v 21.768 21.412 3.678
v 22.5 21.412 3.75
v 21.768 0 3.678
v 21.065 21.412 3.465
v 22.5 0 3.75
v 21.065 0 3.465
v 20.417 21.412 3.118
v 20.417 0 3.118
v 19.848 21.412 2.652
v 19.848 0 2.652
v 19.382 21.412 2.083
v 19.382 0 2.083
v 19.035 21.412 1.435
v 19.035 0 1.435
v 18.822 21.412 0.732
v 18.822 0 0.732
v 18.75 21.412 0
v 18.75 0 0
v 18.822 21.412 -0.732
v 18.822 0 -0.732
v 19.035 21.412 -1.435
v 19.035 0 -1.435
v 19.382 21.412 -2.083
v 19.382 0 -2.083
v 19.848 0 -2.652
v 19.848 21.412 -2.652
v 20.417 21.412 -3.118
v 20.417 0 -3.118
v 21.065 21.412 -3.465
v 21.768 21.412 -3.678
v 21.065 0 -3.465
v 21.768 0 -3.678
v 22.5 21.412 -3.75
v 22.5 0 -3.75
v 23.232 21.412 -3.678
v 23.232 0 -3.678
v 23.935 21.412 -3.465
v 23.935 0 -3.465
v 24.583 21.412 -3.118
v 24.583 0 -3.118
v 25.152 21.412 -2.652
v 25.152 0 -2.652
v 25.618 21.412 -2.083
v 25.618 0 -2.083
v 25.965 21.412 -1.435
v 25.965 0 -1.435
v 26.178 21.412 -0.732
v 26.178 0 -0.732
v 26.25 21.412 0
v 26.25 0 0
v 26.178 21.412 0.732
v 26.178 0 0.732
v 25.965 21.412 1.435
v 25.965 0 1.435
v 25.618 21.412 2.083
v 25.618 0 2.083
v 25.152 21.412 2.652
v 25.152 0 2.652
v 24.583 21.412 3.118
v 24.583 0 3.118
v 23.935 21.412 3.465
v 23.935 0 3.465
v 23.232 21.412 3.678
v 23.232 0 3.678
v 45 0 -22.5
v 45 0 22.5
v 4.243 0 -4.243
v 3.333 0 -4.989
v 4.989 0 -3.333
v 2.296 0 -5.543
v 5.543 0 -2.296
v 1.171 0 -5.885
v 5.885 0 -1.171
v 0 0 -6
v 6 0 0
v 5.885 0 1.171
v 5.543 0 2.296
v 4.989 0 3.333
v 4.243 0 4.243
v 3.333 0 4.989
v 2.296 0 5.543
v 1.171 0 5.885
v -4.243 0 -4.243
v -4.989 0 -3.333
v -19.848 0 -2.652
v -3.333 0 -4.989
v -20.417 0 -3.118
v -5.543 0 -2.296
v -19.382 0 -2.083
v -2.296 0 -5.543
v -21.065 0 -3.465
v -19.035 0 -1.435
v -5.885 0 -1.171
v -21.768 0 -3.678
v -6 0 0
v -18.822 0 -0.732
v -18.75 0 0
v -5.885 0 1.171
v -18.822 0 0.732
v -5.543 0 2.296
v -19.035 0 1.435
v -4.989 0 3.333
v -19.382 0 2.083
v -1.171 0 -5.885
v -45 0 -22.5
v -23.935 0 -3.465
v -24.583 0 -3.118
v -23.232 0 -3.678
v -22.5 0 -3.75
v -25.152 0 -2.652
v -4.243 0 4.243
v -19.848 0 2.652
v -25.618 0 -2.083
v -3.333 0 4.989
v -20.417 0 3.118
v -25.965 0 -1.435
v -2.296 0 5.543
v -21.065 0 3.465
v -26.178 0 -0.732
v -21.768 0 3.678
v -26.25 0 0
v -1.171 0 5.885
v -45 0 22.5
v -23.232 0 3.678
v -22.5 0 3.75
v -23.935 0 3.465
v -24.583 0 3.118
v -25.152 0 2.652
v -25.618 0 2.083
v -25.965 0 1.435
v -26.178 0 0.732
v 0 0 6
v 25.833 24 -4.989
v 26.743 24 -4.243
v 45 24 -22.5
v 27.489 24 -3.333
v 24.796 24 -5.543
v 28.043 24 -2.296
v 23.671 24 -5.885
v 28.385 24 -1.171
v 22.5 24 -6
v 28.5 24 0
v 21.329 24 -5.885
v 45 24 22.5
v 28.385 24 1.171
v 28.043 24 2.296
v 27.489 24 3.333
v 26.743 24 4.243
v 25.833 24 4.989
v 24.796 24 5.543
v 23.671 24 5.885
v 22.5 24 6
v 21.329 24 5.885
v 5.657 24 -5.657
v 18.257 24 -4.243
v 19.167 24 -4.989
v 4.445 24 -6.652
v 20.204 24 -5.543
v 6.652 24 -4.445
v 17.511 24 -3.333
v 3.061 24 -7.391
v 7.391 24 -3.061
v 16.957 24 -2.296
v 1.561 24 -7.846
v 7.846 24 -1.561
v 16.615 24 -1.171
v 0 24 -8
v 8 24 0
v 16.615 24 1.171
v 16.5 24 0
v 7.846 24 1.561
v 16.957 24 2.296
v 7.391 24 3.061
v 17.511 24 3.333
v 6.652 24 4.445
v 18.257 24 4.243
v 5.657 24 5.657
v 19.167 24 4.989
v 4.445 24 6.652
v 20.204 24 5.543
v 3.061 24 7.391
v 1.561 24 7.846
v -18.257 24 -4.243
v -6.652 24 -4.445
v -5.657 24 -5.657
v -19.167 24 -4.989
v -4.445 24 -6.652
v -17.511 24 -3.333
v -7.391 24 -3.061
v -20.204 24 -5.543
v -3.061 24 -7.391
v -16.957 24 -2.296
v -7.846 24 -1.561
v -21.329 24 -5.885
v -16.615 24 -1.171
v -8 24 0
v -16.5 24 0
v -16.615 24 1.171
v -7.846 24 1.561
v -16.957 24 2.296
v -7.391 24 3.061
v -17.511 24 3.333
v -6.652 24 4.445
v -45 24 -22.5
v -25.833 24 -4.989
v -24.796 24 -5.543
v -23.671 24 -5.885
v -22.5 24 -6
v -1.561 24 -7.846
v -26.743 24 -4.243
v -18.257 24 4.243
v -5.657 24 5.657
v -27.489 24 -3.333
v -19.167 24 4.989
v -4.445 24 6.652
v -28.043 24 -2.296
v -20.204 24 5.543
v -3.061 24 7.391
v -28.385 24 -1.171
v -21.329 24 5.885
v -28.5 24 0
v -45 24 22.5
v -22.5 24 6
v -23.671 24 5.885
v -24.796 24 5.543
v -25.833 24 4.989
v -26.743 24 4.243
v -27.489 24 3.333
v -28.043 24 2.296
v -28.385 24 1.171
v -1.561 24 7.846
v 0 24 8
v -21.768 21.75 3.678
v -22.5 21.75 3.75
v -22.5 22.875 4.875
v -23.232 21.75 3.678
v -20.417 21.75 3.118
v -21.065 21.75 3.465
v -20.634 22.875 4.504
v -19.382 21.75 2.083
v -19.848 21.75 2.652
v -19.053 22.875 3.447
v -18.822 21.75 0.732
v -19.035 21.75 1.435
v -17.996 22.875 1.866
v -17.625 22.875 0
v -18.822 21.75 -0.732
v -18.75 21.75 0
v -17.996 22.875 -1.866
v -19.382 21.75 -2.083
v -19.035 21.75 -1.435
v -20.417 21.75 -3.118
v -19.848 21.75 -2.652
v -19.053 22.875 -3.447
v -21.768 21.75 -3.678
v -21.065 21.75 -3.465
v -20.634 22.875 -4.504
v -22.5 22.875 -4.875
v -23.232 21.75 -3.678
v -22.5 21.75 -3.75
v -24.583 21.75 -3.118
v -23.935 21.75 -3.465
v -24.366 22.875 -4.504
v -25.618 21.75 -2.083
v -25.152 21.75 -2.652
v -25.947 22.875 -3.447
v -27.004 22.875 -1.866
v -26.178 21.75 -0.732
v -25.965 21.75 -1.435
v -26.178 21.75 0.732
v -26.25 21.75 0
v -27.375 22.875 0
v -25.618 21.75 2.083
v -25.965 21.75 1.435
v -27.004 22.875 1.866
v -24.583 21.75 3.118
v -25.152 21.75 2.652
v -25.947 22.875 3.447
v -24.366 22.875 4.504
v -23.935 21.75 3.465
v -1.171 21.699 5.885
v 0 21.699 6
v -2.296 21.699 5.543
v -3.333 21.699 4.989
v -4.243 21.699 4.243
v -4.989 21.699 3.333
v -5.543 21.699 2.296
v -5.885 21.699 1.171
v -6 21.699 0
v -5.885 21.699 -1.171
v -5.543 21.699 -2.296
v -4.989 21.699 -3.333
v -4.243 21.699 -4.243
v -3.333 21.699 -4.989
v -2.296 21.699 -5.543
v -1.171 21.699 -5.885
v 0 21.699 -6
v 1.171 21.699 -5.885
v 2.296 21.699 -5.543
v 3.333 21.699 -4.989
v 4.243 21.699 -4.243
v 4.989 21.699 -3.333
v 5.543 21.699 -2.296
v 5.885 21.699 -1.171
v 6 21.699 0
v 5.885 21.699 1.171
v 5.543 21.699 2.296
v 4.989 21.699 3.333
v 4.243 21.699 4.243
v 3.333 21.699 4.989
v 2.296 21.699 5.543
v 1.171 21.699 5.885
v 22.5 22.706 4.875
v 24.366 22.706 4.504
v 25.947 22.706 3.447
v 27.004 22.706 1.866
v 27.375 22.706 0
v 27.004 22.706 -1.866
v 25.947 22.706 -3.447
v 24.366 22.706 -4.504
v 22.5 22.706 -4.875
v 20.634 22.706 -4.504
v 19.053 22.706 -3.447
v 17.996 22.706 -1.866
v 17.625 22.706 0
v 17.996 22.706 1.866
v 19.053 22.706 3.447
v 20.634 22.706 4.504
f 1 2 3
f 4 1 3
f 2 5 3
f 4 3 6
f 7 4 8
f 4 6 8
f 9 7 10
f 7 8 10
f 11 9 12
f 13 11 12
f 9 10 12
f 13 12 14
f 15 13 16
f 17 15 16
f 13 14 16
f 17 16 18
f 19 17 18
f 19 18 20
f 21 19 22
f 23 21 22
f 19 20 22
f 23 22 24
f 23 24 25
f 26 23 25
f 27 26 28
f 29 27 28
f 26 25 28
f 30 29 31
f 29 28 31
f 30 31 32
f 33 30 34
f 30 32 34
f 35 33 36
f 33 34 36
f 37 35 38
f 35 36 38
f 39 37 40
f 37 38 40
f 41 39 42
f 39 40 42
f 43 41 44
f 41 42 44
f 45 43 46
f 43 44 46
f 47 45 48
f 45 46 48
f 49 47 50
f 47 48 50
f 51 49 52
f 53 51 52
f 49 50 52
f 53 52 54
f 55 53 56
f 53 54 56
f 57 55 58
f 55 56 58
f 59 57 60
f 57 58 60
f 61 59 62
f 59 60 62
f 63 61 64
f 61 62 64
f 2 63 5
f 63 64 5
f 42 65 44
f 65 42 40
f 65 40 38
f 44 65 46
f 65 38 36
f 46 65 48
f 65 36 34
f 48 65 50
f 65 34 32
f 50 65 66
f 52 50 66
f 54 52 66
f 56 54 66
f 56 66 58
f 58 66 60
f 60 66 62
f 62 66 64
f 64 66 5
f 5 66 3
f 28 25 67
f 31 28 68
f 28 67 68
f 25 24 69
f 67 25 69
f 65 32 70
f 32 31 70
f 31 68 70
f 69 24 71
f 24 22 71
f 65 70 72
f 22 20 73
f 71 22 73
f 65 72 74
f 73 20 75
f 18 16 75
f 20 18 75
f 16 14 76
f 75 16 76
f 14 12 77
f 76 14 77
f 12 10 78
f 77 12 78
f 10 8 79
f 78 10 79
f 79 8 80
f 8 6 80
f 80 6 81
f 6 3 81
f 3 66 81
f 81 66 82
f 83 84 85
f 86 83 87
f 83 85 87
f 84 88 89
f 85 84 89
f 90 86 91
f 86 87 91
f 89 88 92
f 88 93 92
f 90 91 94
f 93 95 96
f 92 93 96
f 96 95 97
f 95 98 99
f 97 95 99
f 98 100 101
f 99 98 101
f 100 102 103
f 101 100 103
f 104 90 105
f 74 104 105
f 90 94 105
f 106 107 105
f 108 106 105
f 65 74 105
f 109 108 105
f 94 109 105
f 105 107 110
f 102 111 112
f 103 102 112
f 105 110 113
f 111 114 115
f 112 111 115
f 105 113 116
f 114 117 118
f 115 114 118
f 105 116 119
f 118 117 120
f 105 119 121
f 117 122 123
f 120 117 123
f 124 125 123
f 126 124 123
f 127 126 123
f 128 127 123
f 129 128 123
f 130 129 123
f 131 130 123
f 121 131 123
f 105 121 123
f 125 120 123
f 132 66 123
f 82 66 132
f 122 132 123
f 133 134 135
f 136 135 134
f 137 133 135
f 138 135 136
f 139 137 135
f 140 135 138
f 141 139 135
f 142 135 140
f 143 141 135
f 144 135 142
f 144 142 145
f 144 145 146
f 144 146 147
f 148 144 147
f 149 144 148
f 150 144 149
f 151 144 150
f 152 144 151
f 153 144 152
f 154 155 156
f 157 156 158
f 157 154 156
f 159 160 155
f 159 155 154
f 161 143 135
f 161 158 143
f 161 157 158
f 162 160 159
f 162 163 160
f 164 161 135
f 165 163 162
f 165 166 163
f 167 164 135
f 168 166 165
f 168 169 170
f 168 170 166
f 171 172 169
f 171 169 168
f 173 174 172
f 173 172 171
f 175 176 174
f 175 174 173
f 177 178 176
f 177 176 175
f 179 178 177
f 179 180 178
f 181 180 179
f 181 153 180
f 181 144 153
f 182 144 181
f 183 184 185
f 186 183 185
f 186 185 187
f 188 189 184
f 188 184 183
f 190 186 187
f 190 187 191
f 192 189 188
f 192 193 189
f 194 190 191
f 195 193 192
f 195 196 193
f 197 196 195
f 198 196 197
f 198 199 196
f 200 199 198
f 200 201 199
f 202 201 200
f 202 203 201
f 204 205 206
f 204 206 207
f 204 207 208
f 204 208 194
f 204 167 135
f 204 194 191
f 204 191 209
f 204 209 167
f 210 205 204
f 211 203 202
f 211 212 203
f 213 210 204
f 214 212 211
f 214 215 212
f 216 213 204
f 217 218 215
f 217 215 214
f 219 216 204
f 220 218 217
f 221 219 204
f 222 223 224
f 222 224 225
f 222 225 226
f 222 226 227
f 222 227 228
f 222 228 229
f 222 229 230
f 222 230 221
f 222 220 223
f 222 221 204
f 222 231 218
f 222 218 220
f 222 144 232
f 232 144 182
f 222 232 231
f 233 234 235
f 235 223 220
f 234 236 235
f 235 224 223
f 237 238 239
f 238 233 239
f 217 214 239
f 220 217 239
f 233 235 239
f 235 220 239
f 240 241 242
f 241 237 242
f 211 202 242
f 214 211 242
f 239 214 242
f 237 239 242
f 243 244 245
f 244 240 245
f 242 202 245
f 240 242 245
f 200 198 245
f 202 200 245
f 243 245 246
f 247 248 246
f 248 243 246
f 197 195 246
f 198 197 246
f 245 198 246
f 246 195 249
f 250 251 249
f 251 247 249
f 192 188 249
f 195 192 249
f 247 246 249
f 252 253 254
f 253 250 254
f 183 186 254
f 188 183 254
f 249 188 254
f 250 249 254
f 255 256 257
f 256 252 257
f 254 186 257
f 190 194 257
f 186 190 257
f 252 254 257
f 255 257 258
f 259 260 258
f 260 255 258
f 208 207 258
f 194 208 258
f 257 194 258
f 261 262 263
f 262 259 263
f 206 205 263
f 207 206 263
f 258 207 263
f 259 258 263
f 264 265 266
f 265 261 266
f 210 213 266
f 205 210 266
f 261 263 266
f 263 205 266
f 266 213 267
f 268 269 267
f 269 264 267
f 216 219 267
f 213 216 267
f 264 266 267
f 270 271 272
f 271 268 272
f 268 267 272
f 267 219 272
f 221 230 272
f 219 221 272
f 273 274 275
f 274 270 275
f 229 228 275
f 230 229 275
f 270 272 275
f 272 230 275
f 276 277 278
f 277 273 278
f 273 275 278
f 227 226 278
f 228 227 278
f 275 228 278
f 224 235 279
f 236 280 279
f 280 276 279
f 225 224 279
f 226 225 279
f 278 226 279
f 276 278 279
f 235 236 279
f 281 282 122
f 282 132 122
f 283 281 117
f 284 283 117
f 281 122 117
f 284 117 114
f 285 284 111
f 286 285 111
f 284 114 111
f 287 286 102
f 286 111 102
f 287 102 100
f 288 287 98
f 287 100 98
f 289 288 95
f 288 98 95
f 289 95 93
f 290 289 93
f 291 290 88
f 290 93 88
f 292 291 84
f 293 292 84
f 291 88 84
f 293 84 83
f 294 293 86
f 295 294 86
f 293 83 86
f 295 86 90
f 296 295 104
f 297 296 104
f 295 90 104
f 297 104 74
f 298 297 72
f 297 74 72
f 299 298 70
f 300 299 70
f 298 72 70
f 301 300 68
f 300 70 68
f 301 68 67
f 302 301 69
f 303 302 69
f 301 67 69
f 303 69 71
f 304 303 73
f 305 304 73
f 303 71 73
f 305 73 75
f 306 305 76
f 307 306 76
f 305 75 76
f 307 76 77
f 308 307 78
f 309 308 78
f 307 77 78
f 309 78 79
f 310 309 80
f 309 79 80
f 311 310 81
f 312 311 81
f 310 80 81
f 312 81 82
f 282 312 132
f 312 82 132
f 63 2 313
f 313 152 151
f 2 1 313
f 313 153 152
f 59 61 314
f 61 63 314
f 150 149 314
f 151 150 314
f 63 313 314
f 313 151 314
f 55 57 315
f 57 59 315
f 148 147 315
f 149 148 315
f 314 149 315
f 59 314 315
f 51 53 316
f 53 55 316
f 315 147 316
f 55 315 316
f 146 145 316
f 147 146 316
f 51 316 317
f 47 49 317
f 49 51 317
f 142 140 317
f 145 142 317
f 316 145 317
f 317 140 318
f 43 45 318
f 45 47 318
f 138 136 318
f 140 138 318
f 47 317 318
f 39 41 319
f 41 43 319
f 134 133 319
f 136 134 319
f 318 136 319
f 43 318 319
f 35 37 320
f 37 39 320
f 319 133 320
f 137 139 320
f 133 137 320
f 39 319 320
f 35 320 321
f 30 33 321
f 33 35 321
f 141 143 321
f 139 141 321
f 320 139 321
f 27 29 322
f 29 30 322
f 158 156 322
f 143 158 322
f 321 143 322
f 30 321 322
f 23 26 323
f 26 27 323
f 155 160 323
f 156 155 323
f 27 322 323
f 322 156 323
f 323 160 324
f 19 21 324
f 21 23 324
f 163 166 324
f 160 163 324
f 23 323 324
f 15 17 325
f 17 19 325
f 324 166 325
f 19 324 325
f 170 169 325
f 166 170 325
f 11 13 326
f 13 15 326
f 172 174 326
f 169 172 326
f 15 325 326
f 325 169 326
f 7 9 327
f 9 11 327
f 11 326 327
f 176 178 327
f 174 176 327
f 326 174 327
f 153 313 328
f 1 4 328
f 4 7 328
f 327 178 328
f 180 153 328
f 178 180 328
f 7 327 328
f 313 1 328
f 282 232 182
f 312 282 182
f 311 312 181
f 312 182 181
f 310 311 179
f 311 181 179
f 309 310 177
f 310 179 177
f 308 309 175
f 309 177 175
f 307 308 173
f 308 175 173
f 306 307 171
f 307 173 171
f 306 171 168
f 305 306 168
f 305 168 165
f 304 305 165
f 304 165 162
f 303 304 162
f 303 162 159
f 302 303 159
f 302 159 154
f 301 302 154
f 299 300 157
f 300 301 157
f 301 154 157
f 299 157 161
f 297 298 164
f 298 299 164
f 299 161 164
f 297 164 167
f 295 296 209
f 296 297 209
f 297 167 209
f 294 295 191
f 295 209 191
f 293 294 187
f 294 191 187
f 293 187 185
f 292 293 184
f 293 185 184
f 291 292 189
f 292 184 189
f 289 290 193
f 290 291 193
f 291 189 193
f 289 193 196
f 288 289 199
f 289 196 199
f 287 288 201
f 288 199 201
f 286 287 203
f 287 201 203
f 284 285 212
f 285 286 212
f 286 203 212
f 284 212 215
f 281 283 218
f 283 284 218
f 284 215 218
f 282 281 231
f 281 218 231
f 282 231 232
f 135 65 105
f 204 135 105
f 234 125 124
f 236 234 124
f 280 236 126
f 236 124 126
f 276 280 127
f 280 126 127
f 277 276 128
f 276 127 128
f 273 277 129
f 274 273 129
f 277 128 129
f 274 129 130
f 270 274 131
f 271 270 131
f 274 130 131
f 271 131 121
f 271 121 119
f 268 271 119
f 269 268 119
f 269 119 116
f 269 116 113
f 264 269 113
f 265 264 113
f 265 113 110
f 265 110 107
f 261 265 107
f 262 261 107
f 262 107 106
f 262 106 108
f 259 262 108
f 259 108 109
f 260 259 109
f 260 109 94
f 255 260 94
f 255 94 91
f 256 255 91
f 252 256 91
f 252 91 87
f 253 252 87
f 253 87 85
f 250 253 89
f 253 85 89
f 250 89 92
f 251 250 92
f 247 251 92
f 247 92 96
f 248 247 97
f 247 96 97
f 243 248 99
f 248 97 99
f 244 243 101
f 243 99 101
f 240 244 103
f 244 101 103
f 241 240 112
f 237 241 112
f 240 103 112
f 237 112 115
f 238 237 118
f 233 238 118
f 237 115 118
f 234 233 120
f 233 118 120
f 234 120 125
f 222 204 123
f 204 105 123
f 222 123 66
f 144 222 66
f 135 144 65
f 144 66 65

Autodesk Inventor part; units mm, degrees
ref_plane "YZ Plane" through (0, 0, 0) normal (1, 0, 0) x (0, 1, 0)
ref_plane "XZ Plane" through (0, 0, 0) normal (0, 1, 0) x (-1, 0, 0)
ref_plane "XY Plane" through (0, 0, 0) normal (0, 0, 1) x (1, 0, 0)
sketch "Boceto1" plane through (0, 0, 0) normal (0, 1, 0) x (-1, 0, 0)
  line L0 (45, 22.5) -> (-45, 22.5)
  line L1 (-45, 22.5) -> (-45, -22.5)
  line L2 (-45, -22.5) -> (45, -22.5)
  line L3 (45, -22.5) -> (45, 22.5)
  point P0 (-45, 0)
extrude "Extrusión1" add sketch "Boceto1" along normal blind 24
sketch "Boceto2" plane through (0, 24, 0) normal (0, 1, 0) x (1, 0, 0)
  point P0 (-22.5, 0)
hole "Agujero1" at (-22.5, 24, 0) direction (0, -1, 0) diameter 7.5 end through all countersink diameter 12 countersink angle 90
sketch "Boceto3" plane through (0, 24, 0) normal (0, 1, 0) x (1, 0, 0)
  point P0 (0, 0)
hole "Agujero2" at (0, 24, 0) direction (0, -1, 0) diameter 12 end through all countersink diameter 16 countersink angle 82
sketch "Boceto4" plane through (0, 24, 0) normal (0, 1, 0) x (1, 0, 0)
  point P0 (0, 0)
  point P1 (0, 0)
  point P2 (22.5, 0)
hole "Agujero3" at (0, 24, 0) at (22.5, 24, 0) direction (0, -1, 0) diameter 7.5 end through all countersink diameter 12 countersink angle 82
properties part number "sujecion_castor" material "Aluminio 6061"
